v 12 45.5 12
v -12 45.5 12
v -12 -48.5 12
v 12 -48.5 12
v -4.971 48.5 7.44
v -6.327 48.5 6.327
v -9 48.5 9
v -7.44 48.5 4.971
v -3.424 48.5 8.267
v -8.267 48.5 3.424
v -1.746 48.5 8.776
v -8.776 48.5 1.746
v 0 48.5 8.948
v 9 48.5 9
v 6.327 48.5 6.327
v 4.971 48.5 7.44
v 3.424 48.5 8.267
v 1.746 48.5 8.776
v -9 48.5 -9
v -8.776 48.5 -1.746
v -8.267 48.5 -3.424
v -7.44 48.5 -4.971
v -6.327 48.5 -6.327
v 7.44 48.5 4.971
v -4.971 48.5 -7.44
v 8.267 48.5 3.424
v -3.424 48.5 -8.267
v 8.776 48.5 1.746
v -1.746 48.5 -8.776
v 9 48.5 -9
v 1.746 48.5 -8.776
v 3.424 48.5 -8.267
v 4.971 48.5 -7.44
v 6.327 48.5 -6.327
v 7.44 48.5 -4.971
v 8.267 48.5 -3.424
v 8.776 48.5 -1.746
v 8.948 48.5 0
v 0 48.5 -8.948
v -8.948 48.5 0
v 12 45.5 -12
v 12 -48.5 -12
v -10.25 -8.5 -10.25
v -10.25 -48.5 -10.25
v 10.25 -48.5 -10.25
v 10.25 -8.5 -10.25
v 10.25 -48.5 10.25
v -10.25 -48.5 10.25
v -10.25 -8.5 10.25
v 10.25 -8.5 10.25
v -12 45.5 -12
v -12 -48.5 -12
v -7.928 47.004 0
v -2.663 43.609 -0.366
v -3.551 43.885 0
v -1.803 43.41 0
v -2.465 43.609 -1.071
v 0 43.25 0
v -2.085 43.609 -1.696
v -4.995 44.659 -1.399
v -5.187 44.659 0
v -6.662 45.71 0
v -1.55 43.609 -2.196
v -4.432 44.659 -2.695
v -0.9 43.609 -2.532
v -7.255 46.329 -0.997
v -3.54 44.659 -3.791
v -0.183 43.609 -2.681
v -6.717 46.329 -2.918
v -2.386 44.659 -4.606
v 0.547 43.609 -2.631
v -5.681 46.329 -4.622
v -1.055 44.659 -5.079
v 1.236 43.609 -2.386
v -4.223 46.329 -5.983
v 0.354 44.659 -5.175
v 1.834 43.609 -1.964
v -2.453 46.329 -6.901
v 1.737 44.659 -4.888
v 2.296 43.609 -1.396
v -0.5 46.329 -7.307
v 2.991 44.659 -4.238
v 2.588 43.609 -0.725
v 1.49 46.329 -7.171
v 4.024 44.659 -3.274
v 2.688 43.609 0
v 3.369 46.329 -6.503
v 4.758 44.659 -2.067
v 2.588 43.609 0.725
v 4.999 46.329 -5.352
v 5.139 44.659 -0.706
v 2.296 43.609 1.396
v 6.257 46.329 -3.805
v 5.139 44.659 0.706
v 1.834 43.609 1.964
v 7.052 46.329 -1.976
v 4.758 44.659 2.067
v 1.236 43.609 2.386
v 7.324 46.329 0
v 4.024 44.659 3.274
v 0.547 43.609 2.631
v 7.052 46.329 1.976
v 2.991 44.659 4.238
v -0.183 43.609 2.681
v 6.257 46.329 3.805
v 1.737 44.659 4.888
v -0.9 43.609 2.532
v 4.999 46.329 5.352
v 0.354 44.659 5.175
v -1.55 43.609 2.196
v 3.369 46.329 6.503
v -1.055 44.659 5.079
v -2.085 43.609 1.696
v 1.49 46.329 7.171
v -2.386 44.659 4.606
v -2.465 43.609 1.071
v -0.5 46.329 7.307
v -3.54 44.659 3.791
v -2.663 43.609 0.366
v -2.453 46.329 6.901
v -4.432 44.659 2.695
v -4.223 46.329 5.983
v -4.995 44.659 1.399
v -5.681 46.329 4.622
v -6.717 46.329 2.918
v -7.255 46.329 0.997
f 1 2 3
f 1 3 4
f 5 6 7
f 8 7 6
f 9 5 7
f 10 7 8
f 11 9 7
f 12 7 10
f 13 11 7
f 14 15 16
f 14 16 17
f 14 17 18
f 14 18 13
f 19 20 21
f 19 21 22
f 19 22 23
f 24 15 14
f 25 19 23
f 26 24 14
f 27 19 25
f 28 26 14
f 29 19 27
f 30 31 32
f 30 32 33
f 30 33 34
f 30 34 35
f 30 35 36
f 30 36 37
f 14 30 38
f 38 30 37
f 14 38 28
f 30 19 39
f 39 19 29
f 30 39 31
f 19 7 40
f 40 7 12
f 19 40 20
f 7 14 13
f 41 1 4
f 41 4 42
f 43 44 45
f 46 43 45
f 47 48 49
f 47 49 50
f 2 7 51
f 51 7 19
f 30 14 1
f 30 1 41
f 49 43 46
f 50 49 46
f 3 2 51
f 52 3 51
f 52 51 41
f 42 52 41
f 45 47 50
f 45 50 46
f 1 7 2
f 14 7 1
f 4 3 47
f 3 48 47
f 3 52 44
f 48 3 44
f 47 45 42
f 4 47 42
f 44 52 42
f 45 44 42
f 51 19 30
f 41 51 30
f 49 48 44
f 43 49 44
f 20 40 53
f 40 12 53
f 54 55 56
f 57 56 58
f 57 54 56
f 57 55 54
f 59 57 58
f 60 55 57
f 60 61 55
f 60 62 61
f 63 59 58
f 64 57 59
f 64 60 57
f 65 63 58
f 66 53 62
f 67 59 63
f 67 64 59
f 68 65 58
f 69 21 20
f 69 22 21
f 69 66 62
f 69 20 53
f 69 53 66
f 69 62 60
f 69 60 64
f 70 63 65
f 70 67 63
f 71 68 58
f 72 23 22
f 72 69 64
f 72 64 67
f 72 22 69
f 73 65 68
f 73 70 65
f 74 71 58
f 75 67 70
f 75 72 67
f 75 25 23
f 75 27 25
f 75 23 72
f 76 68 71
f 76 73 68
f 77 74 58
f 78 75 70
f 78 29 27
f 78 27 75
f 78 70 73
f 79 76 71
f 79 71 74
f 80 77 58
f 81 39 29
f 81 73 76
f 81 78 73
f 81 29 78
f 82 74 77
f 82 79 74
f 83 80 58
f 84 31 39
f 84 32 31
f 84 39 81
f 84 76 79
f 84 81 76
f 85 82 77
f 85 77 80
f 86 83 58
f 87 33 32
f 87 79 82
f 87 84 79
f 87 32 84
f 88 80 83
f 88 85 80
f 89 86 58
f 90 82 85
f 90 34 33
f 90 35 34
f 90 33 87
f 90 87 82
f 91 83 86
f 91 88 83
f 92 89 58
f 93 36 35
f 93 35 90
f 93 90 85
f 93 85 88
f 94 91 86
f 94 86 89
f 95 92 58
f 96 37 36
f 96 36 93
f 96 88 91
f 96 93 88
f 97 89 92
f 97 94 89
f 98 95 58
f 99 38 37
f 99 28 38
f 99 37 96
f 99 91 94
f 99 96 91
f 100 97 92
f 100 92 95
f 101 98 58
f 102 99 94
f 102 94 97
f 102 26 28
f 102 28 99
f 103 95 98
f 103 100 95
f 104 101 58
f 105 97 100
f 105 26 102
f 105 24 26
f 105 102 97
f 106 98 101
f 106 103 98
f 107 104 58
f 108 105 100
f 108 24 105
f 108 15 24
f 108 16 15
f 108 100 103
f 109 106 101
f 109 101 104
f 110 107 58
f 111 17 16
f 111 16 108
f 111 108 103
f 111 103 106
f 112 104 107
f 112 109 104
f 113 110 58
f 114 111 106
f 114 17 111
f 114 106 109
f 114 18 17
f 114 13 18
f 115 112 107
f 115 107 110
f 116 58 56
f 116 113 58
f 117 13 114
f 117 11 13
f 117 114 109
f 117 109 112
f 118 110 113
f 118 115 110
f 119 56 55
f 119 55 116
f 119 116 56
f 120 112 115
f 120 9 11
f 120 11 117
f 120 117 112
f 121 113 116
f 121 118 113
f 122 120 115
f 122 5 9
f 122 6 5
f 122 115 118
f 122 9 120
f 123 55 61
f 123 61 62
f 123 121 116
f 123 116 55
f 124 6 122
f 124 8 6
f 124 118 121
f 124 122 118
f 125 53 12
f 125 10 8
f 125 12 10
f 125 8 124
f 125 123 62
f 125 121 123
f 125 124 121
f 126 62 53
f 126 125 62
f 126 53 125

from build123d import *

# Parameters (mm, degrees)
SKETCH1_W           = 24
SKETCH1_H           = 24
SKETCH1_W_2         = 20.5
SKETCH1_H_2         = 20.5
BOSS_EXTRUDE1_DEPTH = 48.5
CUT_EXTRUDE1_START  = -48.5
SKETCH1_4_W         = 20.5
SKETCH1_4_H         = 20.5
CUT_EXTRUDE1_DEPTH  = 40
CHAMFER2_SIZE       = 3


with BuildPart() as part:
    # Sketch1 → Boss-Extrude1 (new, symmetric)
    # profile 1 of 2: a face of its own
    with BuildSketch(Plane(origin=(0, 0, 0), x_dir=(1, 0, 0), z_dir=(0, 1, 0))):
        Rectangle(SKETCH1_W, SKETCH1_H)
        Rectangle(SKETCH1_W_2, SKETCH1_H_2, mode=Mode.SUBTRACT)
    # profile 2 of 2: a face of its own
    with BuildSketch(Plane(origin=(0, 0, 0), x_dir=(1, 0, 0), z_dir=(0, 1, 0))):
        Rectangle(SKETCH1_W_2, SKETCH1_H_2)
    extrude(amount=BOSS_EXTRUDE1_DEPTH, both=True)

    # Sketch1<4> → Cut-Extrude1 (cut)
    with BuildSketch(Plane(origin=(0, 0, 0), x_dir=(1, 0, 0), z_dir=(0, 1, 0)).offset(CUT_EXTRUDE1_START)):
        Rectangle(SKETCH1_4_W, SKETCH1_4_H)
    extrude(amount=CUT_EXTRUDE1_DEPTH, mode=Mode.SUBTRACT)

    # Sketch3 → Cut-Revolve1 (revolve, cut)
    with BuildSketch(Plane.XY):
        with BuildLine():
            Line((-8.947765084, 48.5), (0, 48.5))
            Line((0, 48.5), (0, 43.25))
            ThreePointArc((0, 43.25), (-5.18712348, 44.659397645), (-8.947765084, 48.5))
        make_face()
    revolve(axis=Axis((0, 64.835592649, 0), (0, -1, 0)), mode=Mode.SUBTRACT)

    # Chamfer2
    chamfer2_edges = [part.edges().sort_by_distance(p)[0] for p in [
        (12, 48.5, 0),
        (0, 48.5, -12),
        (-12, 48.5, 0),
        (0, 48.5, 12),
    ]]
    chamfer(chamfer2_edges, length=CHAMFER2_SIZE)


solid = part.part
